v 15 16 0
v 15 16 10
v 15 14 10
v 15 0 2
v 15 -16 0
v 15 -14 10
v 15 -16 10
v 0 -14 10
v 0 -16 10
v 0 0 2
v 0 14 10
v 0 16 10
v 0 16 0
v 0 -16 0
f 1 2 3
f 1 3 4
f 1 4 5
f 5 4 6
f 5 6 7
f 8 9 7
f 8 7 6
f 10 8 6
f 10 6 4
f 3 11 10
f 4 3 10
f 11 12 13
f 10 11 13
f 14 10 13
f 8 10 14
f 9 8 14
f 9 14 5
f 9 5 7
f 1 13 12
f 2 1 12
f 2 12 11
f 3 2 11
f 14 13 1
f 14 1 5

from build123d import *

# Parameters (mm, degrees)
F1_DEPTH = 15


with BuildPart() as f1:
    # F0 (on Right) → F1 (new body)
    with BuildSketch(Plane.YZ):
        Polygon((0, 2), (0, 0), (16, 0), (16, 10), (14, 10), align=None)
    extrude(amount=F1_DEPTH)

    # F2: F1 across face


with BuildPart() as f1_1:
    add(f1.part)
    add(f1.part.mirror(Plane(origin=(7.5, 0, 1), x_dir=(1, 0, 0), z_dir=(0, -1, 0))))


solid = f1_1.part
